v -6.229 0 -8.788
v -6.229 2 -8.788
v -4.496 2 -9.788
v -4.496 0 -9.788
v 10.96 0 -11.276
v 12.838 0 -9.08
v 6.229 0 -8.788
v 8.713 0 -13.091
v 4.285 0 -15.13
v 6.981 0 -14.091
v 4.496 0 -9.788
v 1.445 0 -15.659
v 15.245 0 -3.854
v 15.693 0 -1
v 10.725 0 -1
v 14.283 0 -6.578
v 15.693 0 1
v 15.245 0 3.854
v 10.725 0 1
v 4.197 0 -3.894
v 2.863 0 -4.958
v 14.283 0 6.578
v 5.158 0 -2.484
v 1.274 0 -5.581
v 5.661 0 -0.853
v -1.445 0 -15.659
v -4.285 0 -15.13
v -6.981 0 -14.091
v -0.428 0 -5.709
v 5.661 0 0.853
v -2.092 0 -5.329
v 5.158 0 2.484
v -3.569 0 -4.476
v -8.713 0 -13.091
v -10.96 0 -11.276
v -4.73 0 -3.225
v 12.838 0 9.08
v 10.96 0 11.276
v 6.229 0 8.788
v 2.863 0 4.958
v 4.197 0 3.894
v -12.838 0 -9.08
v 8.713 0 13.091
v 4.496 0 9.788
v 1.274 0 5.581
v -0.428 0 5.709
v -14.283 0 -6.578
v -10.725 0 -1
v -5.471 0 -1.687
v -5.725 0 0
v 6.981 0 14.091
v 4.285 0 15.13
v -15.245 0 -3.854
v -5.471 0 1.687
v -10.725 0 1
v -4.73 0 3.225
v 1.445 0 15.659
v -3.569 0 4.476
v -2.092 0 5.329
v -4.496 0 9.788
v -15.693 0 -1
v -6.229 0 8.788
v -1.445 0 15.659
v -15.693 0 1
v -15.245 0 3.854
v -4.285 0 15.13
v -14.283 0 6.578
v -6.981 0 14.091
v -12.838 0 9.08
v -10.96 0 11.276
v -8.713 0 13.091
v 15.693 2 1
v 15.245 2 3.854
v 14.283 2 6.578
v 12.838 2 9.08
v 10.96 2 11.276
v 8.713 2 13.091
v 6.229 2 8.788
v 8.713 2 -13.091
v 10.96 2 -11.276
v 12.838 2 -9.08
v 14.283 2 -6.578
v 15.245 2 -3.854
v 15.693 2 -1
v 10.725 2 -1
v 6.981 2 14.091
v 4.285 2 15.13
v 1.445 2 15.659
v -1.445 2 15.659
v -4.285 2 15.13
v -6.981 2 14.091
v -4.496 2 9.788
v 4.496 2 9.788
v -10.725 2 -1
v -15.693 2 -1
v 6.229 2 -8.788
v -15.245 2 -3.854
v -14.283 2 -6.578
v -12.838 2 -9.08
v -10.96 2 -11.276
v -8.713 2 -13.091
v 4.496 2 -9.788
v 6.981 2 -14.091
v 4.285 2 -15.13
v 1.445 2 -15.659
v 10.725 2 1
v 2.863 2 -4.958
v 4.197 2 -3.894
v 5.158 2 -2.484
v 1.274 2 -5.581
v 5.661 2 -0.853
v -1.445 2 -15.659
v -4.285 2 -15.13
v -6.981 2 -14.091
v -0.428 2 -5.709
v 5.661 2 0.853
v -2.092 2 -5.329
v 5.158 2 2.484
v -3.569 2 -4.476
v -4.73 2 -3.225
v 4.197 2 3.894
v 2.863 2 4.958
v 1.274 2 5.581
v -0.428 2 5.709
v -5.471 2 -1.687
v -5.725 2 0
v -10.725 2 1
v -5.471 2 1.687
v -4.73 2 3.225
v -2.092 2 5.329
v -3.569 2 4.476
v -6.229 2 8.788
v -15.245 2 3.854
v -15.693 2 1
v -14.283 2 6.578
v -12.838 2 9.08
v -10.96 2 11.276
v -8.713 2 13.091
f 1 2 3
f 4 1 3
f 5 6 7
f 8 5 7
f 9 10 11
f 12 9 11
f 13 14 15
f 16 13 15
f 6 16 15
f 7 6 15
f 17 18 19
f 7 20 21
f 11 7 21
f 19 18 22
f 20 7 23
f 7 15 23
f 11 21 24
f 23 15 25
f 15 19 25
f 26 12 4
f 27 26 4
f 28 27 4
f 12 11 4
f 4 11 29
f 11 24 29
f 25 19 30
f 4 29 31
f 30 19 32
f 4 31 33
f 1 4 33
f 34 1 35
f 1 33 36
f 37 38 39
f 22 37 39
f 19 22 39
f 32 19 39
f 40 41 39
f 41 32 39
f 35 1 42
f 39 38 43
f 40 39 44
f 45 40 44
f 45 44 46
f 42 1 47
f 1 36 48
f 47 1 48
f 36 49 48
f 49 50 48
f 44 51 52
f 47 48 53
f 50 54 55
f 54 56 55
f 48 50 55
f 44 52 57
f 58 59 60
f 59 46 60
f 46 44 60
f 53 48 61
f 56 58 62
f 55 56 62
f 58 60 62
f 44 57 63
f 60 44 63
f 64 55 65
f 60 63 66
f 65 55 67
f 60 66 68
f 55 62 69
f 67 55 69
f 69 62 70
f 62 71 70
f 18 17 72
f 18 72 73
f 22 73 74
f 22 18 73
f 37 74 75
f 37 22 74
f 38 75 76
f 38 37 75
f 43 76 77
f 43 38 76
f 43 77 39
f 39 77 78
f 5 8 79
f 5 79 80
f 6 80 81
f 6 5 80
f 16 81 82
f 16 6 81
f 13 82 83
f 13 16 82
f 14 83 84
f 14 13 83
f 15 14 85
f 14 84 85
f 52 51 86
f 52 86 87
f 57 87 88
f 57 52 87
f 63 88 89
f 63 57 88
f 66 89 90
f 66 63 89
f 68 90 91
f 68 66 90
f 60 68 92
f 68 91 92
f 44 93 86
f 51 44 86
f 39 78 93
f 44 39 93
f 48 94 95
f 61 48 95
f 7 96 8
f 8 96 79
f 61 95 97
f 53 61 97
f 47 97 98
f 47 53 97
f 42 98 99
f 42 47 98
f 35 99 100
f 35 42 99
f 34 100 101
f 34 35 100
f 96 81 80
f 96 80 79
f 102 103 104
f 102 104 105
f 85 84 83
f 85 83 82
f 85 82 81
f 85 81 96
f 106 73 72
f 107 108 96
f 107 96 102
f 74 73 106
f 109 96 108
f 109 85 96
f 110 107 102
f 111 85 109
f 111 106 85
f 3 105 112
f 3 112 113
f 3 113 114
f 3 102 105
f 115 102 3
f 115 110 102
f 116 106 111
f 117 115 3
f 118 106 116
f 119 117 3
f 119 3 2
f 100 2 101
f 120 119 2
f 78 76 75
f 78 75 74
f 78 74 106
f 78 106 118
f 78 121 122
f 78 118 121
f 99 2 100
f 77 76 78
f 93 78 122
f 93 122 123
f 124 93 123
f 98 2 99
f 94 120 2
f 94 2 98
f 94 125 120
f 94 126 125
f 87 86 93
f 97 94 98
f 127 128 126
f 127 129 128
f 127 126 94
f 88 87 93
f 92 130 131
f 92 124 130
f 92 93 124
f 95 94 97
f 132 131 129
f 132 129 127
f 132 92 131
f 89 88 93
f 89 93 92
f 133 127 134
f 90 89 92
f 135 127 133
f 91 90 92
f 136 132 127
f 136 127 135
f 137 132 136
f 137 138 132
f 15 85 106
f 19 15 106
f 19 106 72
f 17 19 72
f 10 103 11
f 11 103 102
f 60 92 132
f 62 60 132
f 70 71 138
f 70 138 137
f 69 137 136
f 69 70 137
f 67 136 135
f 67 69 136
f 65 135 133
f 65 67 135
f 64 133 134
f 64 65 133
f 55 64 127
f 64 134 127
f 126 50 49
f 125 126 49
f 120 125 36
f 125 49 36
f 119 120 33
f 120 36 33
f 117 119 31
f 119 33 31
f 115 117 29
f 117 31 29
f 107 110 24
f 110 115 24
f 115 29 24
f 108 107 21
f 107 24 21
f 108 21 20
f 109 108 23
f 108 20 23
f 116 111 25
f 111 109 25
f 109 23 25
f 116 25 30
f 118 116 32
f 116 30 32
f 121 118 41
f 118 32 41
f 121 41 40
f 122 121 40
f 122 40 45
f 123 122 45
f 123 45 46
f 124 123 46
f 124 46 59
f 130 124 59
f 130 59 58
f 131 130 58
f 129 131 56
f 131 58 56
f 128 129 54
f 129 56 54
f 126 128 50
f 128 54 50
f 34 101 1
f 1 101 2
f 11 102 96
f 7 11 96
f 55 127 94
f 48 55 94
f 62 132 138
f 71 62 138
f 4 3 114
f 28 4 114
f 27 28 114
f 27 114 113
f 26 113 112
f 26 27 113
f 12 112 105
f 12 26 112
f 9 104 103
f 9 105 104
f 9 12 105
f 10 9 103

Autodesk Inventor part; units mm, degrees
ref_plane "YZ Plane" through (0, 0, 0) normal (1, 0, 0) x (0, 1, 0)
ref_plane "XZ Plane" through (0, 0, 0) normal (0, 1, 0) x (-1, 0, 0)
ref_plane "XY Plane" through (0, 0, 0) normal (0, 0, 1) x (1, 0, 0)
sketch "Sketch1" plane through (0, 0, 0) normal (0, 1, 0) x (-1, 0, 0)
  circle A0 centre (0, 0) radius 15.725
  circle A1 centre (0, 0) radius 5.725
  dimension "d0" = 31.45
  dimension "d1" = 11.45
extrude "Extrusion1" add sketch "Sketch1" along normal blind 2
sketch "Sketch2" plane through (0, 2, 0) normal (0, 1, 0) x (1, 0, 0)
  line L0 (-20.725, -1) -> (-10.725, -1)
  line L1 (-10.725, -1) -> (-10.725, 1)
  line L2 (-10.725, 1) -> (-20.725, 1)
  line L3 (-20.725, 1) -> (-20.725, -1)
  point P0 (0, 0)
  dimension "d4" = 1
  dimension "d5" = 2
  dimension "d6" = 10
  dimension "d7" = 10.725
extrude "Extrusion2" cut sketch "Sketch2" against normal blind 2
pattern_circular "Circular Pattern1" count 6 over 360 about axis through (0, -10, 0) along (0, 1, 0) of "Extrusion2"
properties part number "Ring_n8"
